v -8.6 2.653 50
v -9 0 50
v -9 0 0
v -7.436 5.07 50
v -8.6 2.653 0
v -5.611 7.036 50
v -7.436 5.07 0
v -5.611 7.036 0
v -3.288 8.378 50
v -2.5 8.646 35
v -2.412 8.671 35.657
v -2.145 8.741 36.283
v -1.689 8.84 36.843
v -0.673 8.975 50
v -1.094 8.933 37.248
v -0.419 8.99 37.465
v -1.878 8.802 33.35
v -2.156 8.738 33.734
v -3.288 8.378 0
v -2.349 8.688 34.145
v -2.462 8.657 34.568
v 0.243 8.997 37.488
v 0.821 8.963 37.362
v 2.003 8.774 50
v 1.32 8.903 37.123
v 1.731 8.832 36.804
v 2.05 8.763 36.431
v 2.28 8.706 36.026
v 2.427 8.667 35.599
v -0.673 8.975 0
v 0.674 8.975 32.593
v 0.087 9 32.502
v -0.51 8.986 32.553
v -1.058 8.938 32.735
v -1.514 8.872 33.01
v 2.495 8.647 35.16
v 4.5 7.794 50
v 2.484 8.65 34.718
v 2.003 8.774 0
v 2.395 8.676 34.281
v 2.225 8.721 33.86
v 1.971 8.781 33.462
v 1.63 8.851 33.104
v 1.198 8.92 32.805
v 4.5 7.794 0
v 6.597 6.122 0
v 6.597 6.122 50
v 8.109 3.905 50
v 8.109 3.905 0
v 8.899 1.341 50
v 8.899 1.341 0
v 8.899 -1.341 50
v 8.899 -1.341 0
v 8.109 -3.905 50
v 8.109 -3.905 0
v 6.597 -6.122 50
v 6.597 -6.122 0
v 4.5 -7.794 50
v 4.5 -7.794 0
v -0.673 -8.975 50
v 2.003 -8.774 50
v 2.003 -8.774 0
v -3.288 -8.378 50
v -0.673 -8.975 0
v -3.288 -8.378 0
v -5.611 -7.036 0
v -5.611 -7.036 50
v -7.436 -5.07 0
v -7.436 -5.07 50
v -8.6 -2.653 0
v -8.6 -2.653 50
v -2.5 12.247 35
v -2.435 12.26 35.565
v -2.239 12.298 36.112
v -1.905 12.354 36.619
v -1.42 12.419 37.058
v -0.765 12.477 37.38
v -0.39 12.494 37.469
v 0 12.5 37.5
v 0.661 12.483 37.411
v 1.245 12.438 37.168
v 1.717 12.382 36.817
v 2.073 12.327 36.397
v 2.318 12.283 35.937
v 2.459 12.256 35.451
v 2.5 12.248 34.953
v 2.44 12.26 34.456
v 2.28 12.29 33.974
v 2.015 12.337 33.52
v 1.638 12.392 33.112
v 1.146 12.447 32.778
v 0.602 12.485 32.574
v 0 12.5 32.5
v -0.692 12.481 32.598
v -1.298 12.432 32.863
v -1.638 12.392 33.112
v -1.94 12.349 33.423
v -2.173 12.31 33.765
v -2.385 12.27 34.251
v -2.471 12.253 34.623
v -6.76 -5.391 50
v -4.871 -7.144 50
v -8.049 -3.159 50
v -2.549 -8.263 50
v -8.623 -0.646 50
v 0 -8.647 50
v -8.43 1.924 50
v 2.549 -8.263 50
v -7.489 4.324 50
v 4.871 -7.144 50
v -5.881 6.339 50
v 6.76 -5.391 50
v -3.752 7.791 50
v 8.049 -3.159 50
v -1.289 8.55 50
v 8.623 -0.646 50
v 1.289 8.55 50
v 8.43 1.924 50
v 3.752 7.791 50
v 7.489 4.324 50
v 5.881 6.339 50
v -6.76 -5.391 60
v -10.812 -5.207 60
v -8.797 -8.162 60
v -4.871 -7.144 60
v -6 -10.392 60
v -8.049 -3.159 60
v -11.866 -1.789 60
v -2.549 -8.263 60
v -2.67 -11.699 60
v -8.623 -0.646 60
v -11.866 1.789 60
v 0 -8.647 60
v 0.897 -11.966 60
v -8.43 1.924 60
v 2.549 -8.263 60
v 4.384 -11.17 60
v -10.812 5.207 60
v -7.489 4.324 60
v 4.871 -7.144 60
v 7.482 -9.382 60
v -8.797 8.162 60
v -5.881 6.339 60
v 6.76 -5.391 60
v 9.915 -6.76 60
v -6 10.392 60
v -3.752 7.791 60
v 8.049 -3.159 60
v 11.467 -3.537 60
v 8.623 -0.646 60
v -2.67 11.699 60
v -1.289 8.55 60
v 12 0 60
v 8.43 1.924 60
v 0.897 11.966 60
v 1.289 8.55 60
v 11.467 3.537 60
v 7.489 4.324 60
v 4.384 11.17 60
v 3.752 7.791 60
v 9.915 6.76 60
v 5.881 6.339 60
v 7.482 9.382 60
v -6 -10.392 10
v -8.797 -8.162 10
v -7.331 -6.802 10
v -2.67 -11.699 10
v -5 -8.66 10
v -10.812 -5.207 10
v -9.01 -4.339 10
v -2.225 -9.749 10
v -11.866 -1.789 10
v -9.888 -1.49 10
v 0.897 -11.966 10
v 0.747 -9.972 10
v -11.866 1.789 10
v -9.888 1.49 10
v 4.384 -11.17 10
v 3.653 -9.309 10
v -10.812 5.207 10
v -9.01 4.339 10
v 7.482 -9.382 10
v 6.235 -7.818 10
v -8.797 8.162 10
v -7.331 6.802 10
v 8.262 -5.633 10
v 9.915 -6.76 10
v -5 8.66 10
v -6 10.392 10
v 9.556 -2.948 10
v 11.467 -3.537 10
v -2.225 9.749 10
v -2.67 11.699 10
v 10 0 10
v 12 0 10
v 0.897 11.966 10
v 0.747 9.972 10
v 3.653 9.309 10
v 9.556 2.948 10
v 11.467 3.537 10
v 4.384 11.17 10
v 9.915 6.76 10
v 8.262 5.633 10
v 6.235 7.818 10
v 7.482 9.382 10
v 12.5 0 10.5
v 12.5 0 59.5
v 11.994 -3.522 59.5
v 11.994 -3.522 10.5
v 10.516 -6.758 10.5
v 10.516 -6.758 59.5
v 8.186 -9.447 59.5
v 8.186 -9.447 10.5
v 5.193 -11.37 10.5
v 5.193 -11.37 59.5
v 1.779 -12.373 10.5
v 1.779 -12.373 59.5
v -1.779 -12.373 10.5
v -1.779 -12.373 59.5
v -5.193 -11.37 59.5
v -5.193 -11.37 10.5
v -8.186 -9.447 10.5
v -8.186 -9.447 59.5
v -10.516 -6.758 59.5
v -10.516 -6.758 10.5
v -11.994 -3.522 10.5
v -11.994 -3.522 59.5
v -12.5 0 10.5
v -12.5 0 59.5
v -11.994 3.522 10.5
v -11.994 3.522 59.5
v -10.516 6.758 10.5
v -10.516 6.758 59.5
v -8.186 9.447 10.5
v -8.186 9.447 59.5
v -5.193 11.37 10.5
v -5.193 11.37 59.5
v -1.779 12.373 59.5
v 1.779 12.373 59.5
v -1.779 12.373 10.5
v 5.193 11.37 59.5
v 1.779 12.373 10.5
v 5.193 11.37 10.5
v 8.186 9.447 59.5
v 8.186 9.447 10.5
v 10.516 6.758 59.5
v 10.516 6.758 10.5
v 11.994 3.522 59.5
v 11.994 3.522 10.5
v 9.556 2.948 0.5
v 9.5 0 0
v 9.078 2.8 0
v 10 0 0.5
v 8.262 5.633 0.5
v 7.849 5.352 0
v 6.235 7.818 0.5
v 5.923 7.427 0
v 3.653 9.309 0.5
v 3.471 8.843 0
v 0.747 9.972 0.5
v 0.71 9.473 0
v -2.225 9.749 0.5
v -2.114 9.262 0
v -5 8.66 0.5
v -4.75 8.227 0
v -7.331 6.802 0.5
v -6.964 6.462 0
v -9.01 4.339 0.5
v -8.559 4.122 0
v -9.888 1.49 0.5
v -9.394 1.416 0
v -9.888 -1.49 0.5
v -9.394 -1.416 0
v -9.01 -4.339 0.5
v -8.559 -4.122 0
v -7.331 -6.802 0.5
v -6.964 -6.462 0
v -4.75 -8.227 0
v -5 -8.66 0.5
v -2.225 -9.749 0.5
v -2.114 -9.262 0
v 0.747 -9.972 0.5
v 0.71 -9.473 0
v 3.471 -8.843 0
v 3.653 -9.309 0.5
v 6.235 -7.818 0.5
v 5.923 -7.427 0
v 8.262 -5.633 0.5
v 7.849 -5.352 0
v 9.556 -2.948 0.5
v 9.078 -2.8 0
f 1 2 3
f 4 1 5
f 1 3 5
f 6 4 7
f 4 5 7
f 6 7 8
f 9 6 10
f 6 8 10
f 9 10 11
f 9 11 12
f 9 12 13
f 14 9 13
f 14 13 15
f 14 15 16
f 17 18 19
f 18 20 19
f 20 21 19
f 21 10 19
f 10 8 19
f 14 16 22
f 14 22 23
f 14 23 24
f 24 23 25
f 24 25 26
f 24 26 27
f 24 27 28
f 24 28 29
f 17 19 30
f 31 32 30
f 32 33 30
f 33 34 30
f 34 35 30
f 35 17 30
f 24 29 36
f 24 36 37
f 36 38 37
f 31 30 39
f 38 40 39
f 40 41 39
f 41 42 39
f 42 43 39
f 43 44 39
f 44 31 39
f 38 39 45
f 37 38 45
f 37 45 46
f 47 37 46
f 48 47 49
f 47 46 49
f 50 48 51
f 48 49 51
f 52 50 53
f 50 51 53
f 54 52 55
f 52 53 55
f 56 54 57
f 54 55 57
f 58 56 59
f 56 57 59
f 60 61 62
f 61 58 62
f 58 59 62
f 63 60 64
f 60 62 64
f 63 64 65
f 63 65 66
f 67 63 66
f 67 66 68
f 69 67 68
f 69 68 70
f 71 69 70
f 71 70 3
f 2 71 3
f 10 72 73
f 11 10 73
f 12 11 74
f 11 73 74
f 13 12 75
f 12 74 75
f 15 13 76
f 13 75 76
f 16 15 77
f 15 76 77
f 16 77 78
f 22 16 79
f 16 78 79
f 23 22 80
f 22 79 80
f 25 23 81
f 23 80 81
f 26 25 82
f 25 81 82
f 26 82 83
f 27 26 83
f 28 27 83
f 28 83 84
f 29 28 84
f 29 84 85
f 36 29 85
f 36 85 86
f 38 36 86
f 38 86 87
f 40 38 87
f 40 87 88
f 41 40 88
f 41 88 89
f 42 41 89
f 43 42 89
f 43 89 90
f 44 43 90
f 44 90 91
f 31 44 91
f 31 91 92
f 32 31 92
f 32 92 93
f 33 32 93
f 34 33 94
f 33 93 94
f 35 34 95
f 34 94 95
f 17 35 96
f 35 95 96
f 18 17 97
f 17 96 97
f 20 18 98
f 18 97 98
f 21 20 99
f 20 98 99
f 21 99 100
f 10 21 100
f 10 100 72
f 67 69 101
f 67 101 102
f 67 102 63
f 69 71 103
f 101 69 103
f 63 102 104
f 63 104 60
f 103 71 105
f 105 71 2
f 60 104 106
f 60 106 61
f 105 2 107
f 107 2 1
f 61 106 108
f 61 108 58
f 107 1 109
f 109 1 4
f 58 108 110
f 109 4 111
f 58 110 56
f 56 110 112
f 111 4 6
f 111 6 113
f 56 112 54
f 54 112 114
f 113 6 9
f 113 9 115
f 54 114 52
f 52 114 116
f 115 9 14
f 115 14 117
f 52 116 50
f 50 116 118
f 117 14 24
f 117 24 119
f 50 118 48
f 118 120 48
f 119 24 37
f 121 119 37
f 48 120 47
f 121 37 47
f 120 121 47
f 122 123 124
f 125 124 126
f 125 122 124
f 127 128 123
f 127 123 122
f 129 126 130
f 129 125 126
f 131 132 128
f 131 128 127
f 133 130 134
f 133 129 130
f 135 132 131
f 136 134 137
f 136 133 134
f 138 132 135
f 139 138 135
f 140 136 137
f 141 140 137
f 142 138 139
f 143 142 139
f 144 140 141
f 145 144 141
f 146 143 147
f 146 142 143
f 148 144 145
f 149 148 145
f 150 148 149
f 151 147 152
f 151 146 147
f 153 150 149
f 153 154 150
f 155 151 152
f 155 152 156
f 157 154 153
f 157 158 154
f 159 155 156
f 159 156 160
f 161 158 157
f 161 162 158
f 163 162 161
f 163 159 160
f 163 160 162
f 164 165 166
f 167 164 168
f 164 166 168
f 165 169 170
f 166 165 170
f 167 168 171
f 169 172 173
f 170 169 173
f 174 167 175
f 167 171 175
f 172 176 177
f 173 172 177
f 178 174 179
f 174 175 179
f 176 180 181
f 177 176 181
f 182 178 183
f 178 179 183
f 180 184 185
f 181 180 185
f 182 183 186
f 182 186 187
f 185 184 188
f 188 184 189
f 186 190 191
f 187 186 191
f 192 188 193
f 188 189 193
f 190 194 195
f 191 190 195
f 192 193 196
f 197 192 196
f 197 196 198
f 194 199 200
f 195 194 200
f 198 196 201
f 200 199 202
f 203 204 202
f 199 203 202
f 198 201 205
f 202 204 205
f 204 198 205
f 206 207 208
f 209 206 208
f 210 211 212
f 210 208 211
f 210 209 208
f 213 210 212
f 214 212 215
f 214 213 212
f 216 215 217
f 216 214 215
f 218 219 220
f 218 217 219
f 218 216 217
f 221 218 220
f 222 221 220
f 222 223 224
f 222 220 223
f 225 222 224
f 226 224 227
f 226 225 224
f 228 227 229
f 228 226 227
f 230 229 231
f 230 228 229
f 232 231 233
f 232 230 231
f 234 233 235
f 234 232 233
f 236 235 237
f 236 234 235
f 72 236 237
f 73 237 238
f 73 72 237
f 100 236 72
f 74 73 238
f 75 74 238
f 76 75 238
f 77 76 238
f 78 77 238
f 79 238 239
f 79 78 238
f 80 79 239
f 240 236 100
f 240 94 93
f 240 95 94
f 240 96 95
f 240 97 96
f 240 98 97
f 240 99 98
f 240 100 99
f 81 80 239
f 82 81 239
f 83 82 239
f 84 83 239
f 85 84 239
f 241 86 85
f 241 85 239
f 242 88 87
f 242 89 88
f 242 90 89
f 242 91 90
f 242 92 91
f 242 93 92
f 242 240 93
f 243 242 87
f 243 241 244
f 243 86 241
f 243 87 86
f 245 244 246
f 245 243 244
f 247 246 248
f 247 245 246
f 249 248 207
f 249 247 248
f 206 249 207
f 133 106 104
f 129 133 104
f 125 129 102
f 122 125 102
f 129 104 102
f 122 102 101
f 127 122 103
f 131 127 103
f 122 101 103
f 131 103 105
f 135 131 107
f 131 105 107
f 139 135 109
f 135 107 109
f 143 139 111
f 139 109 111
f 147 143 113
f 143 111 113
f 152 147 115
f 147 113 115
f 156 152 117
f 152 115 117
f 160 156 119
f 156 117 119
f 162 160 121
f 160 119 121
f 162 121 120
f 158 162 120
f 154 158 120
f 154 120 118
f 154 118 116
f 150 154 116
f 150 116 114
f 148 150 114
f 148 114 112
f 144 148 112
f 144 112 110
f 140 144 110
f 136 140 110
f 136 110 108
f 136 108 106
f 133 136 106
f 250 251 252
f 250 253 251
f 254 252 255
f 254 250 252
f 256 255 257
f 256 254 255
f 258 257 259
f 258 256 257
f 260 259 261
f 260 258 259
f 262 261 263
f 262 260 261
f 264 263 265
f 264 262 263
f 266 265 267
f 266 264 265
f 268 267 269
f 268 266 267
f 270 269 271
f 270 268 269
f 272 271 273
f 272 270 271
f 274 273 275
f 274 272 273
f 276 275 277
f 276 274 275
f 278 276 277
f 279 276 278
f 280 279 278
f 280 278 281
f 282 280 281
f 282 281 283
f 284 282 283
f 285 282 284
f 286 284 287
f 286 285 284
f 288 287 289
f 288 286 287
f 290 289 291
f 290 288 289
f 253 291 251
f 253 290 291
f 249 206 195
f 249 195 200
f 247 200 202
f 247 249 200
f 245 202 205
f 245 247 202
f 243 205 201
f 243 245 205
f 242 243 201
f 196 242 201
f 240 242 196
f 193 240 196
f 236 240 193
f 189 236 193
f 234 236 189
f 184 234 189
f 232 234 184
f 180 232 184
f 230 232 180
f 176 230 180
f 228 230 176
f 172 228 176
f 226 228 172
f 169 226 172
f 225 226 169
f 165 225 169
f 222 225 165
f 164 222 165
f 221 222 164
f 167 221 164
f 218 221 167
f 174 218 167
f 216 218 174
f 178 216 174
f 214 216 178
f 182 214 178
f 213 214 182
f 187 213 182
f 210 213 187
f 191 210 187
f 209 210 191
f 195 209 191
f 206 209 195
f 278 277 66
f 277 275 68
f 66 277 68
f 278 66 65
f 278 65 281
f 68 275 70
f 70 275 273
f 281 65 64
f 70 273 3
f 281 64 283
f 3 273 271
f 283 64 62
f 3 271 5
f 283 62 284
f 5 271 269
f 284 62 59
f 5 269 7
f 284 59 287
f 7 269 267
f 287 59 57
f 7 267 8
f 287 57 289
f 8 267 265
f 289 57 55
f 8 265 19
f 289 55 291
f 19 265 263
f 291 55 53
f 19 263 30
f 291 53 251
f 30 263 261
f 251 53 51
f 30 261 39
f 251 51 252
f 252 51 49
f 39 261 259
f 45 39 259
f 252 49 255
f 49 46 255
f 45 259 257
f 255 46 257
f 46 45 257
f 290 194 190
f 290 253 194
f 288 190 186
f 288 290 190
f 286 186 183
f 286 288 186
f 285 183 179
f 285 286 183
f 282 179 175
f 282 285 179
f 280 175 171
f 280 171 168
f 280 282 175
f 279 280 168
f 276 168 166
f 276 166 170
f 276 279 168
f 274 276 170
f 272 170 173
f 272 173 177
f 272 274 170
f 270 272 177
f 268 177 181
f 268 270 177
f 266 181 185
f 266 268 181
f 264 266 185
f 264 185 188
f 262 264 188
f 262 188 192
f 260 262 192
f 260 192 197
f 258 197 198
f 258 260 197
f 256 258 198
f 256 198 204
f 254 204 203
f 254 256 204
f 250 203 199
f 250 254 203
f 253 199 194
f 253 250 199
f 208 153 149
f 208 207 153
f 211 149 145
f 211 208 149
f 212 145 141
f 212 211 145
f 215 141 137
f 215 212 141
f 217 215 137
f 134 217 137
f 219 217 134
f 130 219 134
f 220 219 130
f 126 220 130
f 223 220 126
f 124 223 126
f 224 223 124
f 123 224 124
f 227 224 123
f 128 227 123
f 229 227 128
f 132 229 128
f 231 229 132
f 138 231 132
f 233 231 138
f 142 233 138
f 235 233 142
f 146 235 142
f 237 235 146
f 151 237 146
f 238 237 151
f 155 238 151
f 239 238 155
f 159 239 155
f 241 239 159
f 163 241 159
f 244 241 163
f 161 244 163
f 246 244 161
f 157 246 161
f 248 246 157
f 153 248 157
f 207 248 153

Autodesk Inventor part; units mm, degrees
ref_plane "YZ Plane" through (0, 0, 0) normal (1, 0, 0) x (0, 1, 0)
ref_plane "XY Plane" through (0, 0, 0) normal (0, 0, 1) x (1, 0, 0)
sketch "Skizze1" plane through (0, 0, 0) normal (0, 0, 1) x (1, 0, 0)
  line L0 (-14, 0) -> (14, 0) projected
  line L1 (0, -14) -> (0, 14) projected
  circle A0 centre (0, 0) radius 10
  dimension "d0" = 20
extrude "Extrusion1" add sketch "Skizze1" along normal blind 10
sketch "Skizze2" plane through (0, 0, 10) normal (0, 0, 1) x (1, 0, 0)
  circle A0 centre (0, 0) radius 12.5
  dimension "d3" = 25
extrude "Extrusion2" add sketch "Skizze2" along normal blind 50
sketch "Skizze3" plane through (0, 0, 60) normal (0, 0, 1) x (1, 0, 0)
  circle A0 centre (0, 0) radius 10
  dimension "d6" = 20
extrude "Extrusion3" add sketch "Skizze3" along normal blind 10
thread "Gewinde1" size "M20x2.5" class "6g" standard "ANSI Metric M Profile" length 10
thread "Gewinde2" size "M20x2.5" class "6g" standard "ANSI Metric M Profile" length 10
sketch "Skizze4" plane through (0, 0, 0) normal (0, 0, -1) x (-1, 0, 0)
  circle A0 centre (0, 0) radius 9
  dimension "d13" = 18
extrude "Extrusion4" cut sketch "Skizze4" against normal blind 70
ref_plane "Arbeitsebene1" through (0, 12.5, 0) normal (0, 1, 0) x (-1, 0, 0)
sketch "Skizze5" plane through (0, 0, 0) normal (0, 1, 0) x (-1, 0, 0)
  point P0 (0, 0)
sketch "Skizze6" plane through (0, 12.5, 0) normal (0, 1, 0) x (-1, 0, 0)
  circle A0 centre (0, 35) radius 2.5
  point P0 (0, 0)
  dimension "d17" = 35
  dimension "d18" = 5
extrude "Extrusion5" cut sketch "Skizze6" against normal blind 5
chamfer "Fase1" distance 0.5 angle 45 4 edges at (-10, 0, 0) (-10, 0, 70) (-12.5, 0, 10) (-12.5, 0, 60)
sketch "Skizze7" plane through (0, 0, 0) normal (0, 0, -1) x (-1, 0, 0)
  point P0 (0, 0)
  point P1 (0, 0)
sketch "Skizze8" plane through (0, 0, 70) normal (0, 0, 1) x (1, 0, 0)
  circle A0 centre (0, 0) radius 9 projected
  circle A1 centre (0, 0) radius 11.265
extrude "Extrusion6" cut sketch "Skizze8" against normal blind 10 contours A0 | A1
sketch "Skizze9" plane through (0, 0, 60) normal (0, 0, 1) x (1, 0, 0)
  circle A0 centre (0, 0) radius 9
extrude "Extrusion7" add sketch "Skizze9" against normal blind 10
sketch "Skizze10" plane through (0, 0, 60) normal (0, 0, 1) x (1, 0, 0)
  point P0 (0, 0)
hole "Bohrung1" at (0, 0, 60) direction (0, 0, -1) diameter 17.294 end through all thread size "M20x2.5" class "6H" standard "ISO Metric profile"
properties part number "VentilNukleator"
